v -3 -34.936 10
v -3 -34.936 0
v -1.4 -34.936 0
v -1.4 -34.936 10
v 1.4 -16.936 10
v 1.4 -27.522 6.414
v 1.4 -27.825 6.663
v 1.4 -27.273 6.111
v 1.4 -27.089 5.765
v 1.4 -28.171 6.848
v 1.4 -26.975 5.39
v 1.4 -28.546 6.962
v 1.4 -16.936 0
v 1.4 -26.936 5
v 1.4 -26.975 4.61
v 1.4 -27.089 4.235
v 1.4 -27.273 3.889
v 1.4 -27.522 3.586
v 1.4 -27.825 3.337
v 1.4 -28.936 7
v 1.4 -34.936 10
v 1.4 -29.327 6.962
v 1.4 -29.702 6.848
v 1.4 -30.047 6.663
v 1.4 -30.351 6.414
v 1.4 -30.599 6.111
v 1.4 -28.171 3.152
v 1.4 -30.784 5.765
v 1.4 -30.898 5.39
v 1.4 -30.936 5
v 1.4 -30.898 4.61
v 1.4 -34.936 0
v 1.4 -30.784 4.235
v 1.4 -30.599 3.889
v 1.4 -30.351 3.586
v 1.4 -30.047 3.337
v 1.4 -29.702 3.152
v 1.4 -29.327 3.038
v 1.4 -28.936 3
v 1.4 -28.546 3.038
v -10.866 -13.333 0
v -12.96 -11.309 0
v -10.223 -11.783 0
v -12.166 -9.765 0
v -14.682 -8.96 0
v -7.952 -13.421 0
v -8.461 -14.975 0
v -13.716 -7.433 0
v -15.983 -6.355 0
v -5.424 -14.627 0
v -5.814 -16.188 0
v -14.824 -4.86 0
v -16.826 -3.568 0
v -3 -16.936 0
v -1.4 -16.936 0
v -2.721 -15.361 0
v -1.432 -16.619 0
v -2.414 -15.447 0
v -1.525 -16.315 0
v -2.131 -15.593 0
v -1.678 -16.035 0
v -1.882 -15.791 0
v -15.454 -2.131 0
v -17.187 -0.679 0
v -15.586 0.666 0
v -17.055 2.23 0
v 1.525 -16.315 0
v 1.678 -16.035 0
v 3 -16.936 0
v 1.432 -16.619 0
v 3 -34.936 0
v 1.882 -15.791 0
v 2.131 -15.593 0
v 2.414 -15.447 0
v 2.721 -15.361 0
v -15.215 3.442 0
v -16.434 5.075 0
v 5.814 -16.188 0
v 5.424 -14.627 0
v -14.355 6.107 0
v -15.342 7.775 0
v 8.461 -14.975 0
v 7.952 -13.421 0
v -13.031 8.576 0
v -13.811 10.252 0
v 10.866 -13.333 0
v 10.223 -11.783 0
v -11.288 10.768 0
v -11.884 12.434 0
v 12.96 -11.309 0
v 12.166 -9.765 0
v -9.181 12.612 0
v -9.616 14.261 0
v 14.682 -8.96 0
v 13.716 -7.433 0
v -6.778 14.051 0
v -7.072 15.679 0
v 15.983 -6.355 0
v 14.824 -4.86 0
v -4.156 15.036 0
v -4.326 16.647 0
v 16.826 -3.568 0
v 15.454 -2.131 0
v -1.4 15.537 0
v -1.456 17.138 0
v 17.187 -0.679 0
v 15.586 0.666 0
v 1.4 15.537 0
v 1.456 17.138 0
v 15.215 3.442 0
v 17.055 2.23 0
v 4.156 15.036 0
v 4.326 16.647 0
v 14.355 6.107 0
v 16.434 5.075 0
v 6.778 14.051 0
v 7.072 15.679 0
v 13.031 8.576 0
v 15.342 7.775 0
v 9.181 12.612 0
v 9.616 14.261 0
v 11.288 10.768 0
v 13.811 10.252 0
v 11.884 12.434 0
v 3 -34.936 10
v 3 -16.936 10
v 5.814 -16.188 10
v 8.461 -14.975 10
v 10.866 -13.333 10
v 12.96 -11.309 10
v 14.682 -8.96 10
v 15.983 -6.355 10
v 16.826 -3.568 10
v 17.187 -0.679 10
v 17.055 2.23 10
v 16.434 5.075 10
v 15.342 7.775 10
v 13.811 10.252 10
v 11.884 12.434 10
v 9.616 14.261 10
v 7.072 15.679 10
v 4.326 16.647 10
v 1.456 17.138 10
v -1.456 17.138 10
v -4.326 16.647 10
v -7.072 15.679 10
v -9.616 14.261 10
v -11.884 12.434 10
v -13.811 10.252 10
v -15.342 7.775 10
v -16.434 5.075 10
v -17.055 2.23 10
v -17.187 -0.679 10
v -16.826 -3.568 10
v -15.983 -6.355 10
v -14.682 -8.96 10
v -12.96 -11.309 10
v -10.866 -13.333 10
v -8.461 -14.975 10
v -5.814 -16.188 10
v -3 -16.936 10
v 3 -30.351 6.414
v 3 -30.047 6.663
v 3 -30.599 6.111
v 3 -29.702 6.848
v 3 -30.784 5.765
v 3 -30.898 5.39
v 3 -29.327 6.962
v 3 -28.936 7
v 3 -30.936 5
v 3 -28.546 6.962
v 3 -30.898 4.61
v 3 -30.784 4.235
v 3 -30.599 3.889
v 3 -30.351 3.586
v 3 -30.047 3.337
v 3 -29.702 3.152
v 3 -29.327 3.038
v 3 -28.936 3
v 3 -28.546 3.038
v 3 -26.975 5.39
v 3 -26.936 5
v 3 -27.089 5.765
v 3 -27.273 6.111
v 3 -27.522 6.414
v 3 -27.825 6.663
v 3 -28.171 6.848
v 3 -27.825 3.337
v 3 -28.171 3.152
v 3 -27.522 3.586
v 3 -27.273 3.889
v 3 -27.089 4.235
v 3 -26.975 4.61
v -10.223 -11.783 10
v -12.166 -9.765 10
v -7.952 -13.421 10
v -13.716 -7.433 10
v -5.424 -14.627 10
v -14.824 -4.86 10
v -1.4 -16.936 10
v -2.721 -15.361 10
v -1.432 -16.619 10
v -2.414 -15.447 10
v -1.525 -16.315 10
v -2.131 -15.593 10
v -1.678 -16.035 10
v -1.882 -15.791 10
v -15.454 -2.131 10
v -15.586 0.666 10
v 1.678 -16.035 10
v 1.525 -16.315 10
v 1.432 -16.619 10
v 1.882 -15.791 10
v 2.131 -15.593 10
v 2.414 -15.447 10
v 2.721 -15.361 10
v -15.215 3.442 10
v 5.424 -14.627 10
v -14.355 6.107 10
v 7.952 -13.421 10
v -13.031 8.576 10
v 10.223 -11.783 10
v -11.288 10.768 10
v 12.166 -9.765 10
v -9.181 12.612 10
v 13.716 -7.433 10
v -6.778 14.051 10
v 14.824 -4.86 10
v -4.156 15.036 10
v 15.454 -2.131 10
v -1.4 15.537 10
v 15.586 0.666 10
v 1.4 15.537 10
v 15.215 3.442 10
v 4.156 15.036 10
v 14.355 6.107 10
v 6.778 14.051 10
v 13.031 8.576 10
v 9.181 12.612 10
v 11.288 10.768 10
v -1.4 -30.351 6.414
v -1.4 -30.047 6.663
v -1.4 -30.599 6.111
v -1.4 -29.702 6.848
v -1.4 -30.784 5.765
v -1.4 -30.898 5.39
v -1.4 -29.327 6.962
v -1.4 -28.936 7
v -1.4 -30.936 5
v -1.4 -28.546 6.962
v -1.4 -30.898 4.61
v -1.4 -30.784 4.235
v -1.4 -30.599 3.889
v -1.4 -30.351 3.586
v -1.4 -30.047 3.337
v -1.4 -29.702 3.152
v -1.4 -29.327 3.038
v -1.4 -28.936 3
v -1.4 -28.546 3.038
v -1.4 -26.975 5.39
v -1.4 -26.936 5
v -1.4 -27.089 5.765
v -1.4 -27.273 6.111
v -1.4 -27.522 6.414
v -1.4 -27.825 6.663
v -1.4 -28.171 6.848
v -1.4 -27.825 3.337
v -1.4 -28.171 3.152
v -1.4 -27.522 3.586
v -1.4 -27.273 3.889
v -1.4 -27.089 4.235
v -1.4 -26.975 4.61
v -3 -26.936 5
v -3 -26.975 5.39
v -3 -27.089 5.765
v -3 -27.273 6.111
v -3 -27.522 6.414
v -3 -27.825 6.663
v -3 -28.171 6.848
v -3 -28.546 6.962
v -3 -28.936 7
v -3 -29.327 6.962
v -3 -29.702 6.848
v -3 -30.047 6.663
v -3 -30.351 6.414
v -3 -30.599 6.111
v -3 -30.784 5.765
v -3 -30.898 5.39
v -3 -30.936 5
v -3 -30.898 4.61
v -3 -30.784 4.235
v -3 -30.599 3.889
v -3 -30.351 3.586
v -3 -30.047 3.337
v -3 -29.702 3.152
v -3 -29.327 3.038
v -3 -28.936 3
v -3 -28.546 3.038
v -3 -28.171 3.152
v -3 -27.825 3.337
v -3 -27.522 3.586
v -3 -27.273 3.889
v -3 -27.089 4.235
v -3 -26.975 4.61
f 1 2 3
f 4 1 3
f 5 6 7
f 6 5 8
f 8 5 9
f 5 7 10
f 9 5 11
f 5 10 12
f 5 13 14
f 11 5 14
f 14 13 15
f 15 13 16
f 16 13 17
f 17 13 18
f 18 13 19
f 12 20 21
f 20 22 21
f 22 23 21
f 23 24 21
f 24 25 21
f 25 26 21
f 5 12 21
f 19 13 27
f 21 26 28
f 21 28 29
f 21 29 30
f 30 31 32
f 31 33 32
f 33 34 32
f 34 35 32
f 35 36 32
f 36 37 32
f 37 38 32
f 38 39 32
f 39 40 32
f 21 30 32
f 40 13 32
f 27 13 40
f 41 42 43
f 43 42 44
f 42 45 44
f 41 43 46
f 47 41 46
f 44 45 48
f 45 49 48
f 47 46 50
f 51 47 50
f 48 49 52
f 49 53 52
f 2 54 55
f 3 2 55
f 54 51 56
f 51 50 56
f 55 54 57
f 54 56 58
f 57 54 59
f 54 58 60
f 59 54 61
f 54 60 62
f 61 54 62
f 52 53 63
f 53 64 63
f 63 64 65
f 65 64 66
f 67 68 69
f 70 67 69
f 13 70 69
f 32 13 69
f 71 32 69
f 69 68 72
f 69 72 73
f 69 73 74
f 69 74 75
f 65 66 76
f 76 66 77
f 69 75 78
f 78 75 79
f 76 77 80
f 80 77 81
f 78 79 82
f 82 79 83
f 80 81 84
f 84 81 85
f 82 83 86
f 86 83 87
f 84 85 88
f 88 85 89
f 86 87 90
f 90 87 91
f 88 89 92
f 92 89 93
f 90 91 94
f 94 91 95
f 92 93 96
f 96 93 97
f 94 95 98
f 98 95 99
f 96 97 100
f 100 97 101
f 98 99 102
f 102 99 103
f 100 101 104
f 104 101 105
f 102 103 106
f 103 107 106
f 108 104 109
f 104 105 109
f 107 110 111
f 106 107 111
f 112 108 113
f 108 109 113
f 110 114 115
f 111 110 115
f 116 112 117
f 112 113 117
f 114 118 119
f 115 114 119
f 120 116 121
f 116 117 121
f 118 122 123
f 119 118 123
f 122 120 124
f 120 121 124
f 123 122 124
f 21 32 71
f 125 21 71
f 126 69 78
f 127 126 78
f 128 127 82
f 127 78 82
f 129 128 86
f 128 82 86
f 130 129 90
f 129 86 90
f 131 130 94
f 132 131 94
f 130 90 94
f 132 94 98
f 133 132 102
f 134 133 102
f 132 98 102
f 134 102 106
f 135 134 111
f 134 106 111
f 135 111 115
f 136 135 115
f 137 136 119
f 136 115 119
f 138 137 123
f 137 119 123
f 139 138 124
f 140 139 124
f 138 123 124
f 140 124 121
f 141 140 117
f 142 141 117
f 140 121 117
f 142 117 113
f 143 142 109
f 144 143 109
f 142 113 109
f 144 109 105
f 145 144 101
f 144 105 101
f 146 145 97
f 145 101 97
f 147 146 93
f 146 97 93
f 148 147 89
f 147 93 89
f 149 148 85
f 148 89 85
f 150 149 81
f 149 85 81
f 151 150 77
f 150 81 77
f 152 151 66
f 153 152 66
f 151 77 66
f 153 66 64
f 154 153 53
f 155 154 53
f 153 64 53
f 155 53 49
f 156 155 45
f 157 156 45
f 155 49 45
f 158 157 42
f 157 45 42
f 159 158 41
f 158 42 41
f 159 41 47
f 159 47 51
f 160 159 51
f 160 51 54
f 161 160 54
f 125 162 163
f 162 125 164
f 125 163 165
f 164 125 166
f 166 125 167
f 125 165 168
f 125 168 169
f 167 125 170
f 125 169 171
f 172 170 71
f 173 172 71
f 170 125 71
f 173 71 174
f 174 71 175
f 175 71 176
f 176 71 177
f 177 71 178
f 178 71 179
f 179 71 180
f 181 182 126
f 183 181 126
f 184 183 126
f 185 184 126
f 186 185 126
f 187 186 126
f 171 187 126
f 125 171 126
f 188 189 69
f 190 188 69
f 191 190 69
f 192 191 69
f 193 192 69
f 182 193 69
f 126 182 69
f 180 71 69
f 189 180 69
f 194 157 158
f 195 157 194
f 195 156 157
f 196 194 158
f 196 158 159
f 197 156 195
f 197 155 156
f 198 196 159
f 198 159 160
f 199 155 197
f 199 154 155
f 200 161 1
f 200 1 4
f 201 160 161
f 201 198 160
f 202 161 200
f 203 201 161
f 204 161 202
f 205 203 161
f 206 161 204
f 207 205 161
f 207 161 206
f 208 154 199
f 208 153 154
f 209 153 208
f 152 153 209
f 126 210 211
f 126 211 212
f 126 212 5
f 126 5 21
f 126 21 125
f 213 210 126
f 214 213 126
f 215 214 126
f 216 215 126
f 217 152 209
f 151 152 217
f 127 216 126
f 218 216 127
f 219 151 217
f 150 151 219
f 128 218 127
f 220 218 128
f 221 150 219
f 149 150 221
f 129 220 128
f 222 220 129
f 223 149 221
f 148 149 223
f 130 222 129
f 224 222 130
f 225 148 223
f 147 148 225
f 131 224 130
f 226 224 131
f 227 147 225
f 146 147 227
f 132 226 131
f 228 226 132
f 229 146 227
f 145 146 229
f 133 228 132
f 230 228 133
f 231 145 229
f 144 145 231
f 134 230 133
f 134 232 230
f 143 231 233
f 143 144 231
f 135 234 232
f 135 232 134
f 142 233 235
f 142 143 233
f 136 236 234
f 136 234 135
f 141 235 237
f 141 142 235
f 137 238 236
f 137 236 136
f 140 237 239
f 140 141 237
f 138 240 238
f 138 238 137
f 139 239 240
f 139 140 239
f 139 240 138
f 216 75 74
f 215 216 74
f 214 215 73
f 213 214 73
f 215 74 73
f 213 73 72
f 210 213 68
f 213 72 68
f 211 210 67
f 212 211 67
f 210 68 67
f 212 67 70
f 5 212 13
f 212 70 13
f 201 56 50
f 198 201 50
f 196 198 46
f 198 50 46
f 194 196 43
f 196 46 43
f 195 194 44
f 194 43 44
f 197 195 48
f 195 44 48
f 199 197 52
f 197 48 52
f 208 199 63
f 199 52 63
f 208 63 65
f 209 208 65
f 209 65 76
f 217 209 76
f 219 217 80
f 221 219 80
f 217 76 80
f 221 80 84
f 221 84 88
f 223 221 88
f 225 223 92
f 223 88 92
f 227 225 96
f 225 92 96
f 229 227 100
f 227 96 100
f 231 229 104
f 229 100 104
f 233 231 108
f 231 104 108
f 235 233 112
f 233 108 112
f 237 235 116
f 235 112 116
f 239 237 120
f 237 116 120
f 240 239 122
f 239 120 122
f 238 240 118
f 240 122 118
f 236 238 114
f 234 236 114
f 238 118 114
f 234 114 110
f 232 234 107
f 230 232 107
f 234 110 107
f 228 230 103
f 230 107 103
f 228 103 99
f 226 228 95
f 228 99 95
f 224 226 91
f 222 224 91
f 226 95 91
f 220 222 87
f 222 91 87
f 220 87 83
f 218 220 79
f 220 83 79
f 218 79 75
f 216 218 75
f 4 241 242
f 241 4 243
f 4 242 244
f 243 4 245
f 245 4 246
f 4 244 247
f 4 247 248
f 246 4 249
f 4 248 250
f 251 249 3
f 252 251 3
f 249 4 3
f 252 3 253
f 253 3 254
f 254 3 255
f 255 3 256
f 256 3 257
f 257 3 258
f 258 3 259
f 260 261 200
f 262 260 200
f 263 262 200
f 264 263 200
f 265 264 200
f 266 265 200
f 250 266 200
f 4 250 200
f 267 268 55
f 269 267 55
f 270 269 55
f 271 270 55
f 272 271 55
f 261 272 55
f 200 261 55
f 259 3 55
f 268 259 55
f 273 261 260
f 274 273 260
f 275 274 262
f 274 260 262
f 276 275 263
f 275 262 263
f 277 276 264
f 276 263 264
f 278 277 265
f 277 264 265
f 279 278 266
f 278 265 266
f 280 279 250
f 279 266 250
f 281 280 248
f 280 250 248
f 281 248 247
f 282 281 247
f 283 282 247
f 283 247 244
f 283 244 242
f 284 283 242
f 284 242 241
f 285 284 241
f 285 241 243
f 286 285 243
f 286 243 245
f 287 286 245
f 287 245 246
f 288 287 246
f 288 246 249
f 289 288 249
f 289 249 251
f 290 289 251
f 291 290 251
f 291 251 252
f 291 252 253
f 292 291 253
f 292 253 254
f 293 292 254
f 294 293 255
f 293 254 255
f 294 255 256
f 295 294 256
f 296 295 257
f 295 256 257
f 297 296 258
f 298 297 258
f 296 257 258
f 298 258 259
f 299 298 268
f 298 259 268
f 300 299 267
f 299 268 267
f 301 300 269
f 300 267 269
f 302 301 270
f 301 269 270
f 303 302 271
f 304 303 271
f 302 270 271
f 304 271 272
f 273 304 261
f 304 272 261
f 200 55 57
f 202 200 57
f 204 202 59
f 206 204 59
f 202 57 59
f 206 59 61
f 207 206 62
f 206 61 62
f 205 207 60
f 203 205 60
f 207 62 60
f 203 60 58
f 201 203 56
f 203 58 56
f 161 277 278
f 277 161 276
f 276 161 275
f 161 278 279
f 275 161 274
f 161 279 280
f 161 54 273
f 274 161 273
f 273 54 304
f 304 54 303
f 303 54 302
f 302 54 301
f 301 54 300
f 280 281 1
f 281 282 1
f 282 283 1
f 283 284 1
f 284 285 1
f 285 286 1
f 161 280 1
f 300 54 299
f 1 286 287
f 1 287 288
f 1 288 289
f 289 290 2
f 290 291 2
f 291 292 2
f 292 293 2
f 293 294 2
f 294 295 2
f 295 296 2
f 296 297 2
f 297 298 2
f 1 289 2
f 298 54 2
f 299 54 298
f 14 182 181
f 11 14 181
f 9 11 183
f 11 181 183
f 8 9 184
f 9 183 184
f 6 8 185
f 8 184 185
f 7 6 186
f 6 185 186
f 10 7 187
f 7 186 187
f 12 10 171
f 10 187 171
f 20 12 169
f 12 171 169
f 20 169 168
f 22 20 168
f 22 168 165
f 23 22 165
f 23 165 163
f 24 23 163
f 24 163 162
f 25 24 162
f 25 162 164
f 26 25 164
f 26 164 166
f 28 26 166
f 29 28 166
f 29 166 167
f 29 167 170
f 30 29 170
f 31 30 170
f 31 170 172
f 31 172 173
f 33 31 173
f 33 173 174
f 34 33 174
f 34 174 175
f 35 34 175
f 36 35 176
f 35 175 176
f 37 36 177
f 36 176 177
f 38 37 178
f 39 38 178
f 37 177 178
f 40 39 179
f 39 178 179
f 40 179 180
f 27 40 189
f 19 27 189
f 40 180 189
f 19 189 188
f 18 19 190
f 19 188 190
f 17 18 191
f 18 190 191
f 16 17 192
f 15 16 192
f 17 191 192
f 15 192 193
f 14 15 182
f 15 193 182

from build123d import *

# Parameters (mm, degrees)
F1_DEPTH = 10
F2_R     = 2
F3_DEPTH = 30


with BuildPart() as f1:
    # F0 (on Top) → F1 (new body)
    with BuildSketch(Plane.XY):
        with BuildLine():
            ThreePointArc((-2.72093, -15.360877), (0, 15.6), (2.72093, -15.360877))
            ThreePointArc((2.72093, -15.360877), (1.773927, -15.908371), (1.4, -16.936351))
            Line((1.4, -16.936351), (1.4, -34.936351))
            Line((1.4, -34.936351), (3, -34.936351))
            Line((3, -34.936351), (3, -16.936351))
            ThreePointArc((3, -16.936351), (0, 17.2), (-3, -16.936351))
            Line((-3, -16.936351), (-3, -34.936351))
            Line((-3, -34.936351), (-1.4, -34.936351))
            Line((-1.4, -34.936351), (-1.4, -16.936351))
            ThreePointArc((-1.4, -16.936351), (-1.773927, -15.908371), (-2.72093, -15.360877))
        make_face()
    extrude(amount=F1_DEPTH)

    # F2 (on face) → F3 (cut)
    with BuildSketch(Plane.YZ.offset(3)):
        with Locations((-28.936351, 5)):
            Circle(F2_R)
    extrude(amount=-F3_DEPTH, mode=Mode.SUBTRACT)


solid = f1.part
